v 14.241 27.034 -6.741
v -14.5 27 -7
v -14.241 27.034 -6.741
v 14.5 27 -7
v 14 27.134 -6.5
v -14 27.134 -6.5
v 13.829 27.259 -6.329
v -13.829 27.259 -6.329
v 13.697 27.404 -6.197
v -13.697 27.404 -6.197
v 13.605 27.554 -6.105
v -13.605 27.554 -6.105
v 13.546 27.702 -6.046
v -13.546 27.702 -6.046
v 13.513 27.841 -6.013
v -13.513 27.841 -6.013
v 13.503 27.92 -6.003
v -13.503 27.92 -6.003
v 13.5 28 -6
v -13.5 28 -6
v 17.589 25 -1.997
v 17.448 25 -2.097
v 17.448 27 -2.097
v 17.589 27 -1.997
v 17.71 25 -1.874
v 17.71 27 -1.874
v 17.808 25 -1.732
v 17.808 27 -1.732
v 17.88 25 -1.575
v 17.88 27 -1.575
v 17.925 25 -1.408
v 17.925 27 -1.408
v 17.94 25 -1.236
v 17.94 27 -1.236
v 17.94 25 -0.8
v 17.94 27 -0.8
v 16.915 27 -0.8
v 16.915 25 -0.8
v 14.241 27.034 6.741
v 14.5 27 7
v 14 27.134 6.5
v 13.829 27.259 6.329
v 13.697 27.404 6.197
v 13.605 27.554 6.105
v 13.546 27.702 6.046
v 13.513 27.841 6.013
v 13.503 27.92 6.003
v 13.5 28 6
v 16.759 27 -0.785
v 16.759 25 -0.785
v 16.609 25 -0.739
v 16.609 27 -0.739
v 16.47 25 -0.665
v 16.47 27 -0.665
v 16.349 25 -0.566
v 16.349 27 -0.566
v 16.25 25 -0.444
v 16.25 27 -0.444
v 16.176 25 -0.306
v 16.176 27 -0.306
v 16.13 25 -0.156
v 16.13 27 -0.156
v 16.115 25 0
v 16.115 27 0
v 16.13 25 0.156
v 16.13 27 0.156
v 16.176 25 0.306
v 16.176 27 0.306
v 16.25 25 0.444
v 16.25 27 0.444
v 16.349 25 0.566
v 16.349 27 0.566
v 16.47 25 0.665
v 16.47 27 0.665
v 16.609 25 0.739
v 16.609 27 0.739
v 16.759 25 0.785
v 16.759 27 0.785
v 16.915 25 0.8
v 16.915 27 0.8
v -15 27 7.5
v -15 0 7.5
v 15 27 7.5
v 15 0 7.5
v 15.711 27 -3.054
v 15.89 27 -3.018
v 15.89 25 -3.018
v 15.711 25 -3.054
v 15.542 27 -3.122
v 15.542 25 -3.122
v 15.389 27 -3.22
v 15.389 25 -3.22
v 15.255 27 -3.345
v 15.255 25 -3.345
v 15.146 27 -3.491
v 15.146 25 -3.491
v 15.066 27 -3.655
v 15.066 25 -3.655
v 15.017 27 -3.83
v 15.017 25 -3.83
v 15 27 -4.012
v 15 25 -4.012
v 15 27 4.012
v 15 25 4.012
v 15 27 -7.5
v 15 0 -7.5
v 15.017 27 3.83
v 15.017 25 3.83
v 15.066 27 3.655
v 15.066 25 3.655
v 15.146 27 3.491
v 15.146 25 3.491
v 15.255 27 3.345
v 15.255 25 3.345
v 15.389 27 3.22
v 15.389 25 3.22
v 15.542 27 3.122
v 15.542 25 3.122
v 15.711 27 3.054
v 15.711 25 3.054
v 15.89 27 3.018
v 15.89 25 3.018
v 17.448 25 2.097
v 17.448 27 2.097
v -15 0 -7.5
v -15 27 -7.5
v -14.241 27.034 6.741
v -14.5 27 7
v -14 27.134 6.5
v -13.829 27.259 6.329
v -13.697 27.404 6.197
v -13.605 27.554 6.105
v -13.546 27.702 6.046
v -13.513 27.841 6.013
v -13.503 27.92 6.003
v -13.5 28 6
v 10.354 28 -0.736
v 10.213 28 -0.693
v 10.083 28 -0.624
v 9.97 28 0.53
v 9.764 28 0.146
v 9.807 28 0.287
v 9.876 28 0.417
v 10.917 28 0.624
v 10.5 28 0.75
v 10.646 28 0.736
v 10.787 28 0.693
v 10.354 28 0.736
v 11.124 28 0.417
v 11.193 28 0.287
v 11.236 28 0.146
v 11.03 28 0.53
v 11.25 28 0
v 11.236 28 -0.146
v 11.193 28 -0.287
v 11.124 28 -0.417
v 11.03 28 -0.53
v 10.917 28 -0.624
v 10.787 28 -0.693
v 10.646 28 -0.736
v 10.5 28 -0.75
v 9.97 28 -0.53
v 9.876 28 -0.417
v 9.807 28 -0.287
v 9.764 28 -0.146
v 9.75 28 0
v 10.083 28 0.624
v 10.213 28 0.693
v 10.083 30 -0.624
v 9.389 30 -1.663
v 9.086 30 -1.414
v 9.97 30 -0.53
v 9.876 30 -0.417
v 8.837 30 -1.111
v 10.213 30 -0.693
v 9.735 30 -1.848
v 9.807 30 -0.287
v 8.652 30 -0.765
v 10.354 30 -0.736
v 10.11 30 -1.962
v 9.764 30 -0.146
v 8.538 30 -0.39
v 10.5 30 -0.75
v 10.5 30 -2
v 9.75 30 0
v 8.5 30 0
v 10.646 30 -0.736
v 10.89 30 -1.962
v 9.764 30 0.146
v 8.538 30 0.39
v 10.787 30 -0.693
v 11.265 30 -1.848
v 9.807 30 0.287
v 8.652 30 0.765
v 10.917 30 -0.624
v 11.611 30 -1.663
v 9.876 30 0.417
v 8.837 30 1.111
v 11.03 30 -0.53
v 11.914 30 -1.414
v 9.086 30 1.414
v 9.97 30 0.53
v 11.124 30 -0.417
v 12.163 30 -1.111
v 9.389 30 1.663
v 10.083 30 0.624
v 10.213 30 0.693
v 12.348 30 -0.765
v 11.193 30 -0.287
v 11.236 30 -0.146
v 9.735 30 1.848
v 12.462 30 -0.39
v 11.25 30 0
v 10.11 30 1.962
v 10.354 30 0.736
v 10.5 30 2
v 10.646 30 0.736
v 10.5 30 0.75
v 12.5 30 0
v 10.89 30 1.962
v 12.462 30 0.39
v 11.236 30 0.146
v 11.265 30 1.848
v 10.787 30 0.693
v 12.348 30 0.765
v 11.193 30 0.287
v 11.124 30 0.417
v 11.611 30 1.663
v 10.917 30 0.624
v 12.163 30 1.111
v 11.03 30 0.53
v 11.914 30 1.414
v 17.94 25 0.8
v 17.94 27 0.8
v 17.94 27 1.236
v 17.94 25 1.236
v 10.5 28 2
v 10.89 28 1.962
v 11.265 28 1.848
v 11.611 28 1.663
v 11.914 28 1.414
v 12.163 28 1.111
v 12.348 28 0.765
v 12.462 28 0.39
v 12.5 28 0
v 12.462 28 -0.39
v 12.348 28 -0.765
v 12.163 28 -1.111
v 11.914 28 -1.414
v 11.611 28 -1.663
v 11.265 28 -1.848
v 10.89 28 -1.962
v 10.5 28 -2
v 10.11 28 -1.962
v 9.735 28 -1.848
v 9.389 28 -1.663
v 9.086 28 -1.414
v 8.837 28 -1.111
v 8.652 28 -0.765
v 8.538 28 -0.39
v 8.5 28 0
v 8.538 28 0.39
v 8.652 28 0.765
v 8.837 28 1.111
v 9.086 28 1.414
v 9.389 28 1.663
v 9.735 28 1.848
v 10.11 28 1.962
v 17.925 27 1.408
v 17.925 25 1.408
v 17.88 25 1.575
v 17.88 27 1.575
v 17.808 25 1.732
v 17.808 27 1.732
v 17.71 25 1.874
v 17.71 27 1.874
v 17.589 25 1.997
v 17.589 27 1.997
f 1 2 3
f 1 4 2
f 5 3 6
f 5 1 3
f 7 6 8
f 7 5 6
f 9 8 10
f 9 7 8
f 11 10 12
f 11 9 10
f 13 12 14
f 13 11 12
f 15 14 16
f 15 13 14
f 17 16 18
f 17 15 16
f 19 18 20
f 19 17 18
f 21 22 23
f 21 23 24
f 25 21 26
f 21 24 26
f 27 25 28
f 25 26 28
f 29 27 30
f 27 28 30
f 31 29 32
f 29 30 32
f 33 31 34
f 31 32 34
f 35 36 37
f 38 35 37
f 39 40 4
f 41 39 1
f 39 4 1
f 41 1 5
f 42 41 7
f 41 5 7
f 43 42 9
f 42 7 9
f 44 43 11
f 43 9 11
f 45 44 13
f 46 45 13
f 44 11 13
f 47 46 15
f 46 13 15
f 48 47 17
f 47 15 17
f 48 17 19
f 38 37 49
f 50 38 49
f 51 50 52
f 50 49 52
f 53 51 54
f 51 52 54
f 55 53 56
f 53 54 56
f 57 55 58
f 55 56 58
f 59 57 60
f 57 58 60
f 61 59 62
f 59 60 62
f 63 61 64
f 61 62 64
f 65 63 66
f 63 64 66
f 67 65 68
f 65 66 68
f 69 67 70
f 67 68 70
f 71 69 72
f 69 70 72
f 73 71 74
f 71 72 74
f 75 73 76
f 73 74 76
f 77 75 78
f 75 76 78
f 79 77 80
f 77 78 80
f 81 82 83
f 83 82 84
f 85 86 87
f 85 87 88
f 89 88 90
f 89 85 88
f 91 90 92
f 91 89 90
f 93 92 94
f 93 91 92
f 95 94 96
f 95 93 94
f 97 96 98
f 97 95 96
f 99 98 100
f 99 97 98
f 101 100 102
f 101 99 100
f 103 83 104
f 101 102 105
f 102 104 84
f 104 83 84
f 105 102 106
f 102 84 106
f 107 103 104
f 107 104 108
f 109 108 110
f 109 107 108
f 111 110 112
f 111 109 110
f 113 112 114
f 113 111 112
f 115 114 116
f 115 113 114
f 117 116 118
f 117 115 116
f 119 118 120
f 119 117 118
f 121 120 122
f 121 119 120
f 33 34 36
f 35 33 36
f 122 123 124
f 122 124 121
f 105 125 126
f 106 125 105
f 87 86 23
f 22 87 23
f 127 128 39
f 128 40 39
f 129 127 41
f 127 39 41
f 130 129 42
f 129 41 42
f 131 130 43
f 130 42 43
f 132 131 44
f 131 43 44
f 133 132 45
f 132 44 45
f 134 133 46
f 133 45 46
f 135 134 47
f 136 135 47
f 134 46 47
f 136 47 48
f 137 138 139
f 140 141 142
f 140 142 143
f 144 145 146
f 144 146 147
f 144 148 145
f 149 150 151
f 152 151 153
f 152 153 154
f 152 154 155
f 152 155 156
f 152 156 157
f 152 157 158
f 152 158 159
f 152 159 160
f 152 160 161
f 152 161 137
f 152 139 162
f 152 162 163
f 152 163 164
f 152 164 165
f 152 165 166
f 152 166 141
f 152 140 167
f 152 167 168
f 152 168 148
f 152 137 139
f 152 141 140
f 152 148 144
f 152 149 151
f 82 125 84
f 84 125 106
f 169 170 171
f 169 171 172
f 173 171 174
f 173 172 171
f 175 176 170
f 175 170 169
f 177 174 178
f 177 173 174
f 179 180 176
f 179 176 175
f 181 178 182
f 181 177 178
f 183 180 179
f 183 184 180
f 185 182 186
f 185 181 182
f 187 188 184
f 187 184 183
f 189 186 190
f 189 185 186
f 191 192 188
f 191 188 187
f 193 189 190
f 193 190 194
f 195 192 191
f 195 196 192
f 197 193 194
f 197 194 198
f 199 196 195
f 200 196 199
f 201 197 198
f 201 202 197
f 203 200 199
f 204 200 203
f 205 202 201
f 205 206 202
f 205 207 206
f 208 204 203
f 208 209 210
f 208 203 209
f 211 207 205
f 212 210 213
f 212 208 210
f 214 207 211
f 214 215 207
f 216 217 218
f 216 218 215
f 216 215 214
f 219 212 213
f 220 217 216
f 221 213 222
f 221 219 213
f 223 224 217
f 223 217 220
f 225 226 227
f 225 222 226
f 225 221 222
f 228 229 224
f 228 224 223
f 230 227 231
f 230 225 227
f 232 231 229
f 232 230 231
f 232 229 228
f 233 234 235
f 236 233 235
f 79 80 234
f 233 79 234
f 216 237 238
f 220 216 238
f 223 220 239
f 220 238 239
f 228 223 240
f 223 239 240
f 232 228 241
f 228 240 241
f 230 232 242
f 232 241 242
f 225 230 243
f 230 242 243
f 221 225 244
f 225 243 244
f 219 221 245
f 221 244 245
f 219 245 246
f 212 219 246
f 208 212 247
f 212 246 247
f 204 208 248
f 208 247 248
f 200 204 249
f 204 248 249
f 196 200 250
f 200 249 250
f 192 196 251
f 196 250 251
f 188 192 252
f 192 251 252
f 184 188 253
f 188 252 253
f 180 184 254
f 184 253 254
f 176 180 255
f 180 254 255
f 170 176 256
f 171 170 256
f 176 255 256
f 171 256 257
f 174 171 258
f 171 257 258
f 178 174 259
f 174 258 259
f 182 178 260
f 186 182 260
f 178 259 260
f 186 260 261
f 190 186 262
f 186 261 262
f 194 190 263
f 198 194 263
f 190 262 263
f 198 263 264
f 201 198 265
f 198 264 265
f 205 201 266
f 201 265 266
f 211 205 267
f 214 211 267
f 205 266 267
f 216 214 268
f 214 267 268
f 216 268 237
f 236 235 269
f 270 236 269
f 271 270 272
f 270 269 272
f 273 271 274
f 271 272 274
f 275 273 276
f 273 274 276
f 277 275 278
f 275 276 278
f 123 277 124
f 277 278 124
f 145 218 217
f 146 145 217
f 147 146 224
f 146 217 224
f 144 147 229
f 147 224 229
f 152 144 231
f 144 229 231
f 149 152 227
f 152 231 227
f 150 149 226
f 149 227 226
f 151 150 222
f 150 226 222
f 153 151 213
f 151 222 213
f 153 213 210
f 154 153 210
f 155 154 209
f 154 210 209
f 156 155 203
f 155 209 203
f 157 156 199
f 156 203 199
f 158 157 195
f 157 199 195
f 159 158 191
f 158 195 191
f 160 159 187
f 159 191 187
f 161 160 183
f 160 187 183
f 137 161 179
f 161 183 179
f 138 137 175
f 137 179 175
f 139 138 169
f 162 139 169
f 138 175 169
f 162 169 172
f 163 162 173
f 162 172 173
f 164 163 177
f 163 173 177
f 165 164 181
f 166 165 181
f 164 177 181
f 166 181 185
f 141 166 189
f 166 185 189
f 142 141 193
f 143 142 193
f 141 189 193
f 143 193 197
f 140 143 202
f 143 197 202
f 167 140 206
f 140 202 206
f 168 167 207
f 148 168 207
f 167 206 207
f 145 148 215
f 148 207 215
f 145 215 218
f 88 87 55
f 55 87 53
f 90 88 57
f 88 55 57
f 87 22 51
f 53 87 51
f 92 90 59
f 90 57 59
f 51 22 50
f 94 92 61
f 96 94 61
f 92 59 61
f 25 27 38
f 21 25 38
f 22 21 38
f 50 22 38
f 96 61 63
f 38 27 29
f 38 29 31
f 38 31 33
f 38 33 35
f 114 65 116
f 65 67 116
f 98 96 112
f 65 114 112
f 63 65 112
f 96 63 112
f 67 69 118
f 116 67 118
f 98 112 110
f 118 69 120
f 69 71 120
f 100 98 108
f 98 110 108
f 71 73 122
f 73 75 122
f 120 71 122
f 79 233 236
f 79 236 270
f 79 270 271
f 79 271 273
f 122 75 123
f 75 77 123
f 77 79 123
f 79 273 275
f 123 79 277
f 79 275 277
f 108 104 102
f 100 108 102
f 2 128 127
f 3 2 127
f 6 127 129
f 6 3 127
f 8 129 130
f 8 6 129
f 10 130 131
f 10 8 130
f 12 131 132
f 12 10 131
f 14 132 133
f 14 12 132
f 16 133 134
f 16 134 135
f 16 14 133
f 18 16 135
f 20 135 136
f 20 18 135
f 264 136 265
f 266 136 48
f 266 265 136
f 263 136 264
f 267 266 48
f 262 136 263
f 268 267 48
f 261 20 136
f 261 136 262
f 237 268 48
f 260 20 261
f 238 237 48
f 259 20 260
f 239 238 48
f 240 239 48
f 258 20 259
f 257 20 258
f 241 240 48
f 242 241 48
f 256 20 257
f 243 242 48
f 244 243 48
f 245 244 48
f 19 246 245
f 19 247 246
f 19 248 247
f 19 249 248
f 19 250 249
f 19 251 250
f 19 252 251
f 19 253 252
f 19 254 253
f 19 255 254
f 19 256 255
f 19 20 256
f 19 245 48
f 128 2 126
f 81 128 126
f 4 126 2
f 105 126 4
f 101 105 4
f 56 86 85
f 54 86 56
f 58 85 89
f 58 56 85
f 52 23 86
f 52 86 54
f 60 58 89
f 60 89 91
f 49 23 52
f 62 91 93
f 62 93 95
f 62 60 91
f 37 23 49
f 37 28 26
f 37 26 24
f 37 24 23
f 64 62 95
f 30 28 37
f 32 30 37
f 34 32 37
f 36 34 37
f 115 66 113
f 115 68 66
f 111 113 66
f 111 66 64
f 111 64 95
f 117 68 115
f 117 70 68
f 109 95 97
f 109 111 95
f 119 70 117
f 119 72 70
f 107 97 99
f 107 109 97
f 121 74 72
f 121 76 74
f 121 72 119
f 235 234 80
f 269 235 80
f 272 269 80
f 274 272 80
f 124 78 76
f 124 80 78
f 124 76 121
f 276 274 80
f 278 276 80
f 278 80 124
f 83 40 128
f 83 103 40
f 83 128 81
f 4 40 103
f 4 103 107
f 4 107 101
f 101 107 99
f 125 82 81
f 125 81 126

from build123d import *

# Parameters (mm, degrees)
SKETCH1_W           = 30
SKETCH1_H           = 15
BOSS_EXTRUDE1_DEPTH = 27
SKETCH8_W           = 27
SKETCH8_H           = 12
BOSS_EXTRUDE5_DEPTH = 1
FILLET4_R           = 1
SKETCH9_R           = 2
BOSS_EXTRUDE6_DEPTH = 2
SKETCH10_R          = 0.75
CUT_EXTRUDE2_DEPTH  = 2
BOSS_EXTRUDE7_DEPTH = 2
FILLET5_R           = 1


# Some blends are built 0.0001 mm under size
with BuildPart() as part:
    # Sketch1 → Boss-Extrude1 (new body)
    with BuildSketch(Plane(origin=(0, 0, 0), x_dir=(1, 0, 0), z_dir=(0, 1, 0))):
        Rectangle(SKETCH1_W, SKETCH1_H)
    extrude(amount=BOSS_EXTRUDE1_DEPTH)

    # Sketch8 → Boss-Extrude5 (add)
    with BuildSketch(Plane(origin=(0, 27, 0), x_dir=(1, 0, 0), z_dir=(0, 1, 0))):
        Rectangle(SKETCH8_W, SKETCH8_H)
    extrude(amount=BOSS_EXTRUDE5_DEPTH)

    # Fillet4
    fillet4_edges = [part.edges().sort_by_distance(p)[0] for p in [
        (0, 27, 6),
        (13.5, 27, 0),
        (-13.5, 27, 0),
        (0, 27, -6),
    ]]
    fillet(fillet4_edges, radius=FILLET4_R - 0.0001)  # a hair under: the kernel refuses the full size

    # Sketch9 → Boss-Extrude6 (add)
    with BuildSketch(Plane(origin=(0, 28, 0), x_dir=(1, 0, 0), z_dir=(0, 1, 0))):
        with Locations(Location((10.5, 0, 0), (0, 0, 270))):
            Circle(SKETCH9_R)
    extrude(amount=BOSS_EXTRUDE6_DEPTH)

    # Sketch10 → Cut-Extrude2 (cut)
    with BuildSketch(Plane(origin=(0, 30, 0), x_dir=(1, 0, 0), z_dir=(0, 1, 0))):
        with Locations(Location((10.5, 0, 0), (0, 0, 270))):
            Circle(SKETCH10_R)
    extrude(amount=-CUT_EXTRUDE2_DEPTH, mode=Mode.SUBTRACT)

    # Sketch11 → Boss-Extrude7 (add)
    with BuildSketch(Plane(origin=(0, 27, 0), x_dir=(1, 0, 0), z_dir=(0, 1, 0))):
        with BuildLine():
            Line((15, 3.017710153), (15.890097225, 3.017710153))
            Line((15.890097225, 3.017710153), (17.939578486, 1.806653045))
            Line((17.939578486, 1.806653045), (17.939578486, 0.8))
            Line((17.939578486, 0.8), (16.914837856, 0.8))
            ThreePointArc((16.914837856, 0.8), (16.114837856, 0), (16.914837856, -0.8))
            Line((16.914837856, -0.8), (17.939578486, -0.8))
            Line((17.939578486, -0.8), (17.939578486, -1.806653045))
            Line((17.939578486, -1.806653045), (15.890097225, -3.017710153))
            Line((15.890097225, -3.017710153), (15, -3.017710153))
            Line((15, -3.017710153), (15, 3.017710153))
        make_face()
    extrude(amount=-BOSS_EXTRUDE7_DEPTH)

    # Fillet5
    # the kernel refuses this fillet: 1 mm, written as the material it adds along each edge
    with BuildSketch(Plane(origin=(15, 27, 3.017710153), x_dir=(0, 0, 1), z_dir=(0, -1, 0))) as fillet5_piece_1:
        with BuildLine():
            CenterArc((0.993942342, -1), FILLET5_R, 90, 83.690289012)
            Line((0, -0.890097225), (0, 0))
            Line((0, 0), (0.993942342, 0))
        make_face()
    extrude(amount=2)
    with BuildSketch(Plane(origin=(15, 27, -3.017710153), x_dir=(0, 0, -1), z_dir=(0, -1, 0))) as fillet5_piece_2:
        with BuildLine():
            CenterArc((0.993942342, 1), FILLET5_R, 186.309710988, 83.690289012)
            Line((0, 0.890097225), (0, 0))
            Line((0, 0), (0.993942342, 0))
        make_face()
    extrude(amount=2)
    # the kernel refuses this fillet: 1 mm, written as the material it takes off along each edge
    with BuildSketch(Plane(origin=(17.939578486, 28.426575532, -1.806653045), x_dir=(0, 0, 1), z_dir=(0, -1, 0)), Plane(origin=(17.939578486, 28.426575532, 1.806653045), x_dir=(-0.8609265282144232, 0, 0.5087293121264587), z_dir=(0, -1, 0))) as fillet5_2_piece_1:
        with BuildLine():
            CenterArc((FILLET5_R * 0.570630212653, FILLET5_R), FILLET5_R, 210.579226872, 59.420773128)
            Line((-FILLET5_R * 0.290296315561, FILLET5_R * 0.491270687874), (0, 0))
            Line((0, 0), (FILLET5_R * 0.570630212653, 0))
        make_face()
    extrude(amount=4.853151063, mode=Mode.SUBTRACT)


solid = part.part
